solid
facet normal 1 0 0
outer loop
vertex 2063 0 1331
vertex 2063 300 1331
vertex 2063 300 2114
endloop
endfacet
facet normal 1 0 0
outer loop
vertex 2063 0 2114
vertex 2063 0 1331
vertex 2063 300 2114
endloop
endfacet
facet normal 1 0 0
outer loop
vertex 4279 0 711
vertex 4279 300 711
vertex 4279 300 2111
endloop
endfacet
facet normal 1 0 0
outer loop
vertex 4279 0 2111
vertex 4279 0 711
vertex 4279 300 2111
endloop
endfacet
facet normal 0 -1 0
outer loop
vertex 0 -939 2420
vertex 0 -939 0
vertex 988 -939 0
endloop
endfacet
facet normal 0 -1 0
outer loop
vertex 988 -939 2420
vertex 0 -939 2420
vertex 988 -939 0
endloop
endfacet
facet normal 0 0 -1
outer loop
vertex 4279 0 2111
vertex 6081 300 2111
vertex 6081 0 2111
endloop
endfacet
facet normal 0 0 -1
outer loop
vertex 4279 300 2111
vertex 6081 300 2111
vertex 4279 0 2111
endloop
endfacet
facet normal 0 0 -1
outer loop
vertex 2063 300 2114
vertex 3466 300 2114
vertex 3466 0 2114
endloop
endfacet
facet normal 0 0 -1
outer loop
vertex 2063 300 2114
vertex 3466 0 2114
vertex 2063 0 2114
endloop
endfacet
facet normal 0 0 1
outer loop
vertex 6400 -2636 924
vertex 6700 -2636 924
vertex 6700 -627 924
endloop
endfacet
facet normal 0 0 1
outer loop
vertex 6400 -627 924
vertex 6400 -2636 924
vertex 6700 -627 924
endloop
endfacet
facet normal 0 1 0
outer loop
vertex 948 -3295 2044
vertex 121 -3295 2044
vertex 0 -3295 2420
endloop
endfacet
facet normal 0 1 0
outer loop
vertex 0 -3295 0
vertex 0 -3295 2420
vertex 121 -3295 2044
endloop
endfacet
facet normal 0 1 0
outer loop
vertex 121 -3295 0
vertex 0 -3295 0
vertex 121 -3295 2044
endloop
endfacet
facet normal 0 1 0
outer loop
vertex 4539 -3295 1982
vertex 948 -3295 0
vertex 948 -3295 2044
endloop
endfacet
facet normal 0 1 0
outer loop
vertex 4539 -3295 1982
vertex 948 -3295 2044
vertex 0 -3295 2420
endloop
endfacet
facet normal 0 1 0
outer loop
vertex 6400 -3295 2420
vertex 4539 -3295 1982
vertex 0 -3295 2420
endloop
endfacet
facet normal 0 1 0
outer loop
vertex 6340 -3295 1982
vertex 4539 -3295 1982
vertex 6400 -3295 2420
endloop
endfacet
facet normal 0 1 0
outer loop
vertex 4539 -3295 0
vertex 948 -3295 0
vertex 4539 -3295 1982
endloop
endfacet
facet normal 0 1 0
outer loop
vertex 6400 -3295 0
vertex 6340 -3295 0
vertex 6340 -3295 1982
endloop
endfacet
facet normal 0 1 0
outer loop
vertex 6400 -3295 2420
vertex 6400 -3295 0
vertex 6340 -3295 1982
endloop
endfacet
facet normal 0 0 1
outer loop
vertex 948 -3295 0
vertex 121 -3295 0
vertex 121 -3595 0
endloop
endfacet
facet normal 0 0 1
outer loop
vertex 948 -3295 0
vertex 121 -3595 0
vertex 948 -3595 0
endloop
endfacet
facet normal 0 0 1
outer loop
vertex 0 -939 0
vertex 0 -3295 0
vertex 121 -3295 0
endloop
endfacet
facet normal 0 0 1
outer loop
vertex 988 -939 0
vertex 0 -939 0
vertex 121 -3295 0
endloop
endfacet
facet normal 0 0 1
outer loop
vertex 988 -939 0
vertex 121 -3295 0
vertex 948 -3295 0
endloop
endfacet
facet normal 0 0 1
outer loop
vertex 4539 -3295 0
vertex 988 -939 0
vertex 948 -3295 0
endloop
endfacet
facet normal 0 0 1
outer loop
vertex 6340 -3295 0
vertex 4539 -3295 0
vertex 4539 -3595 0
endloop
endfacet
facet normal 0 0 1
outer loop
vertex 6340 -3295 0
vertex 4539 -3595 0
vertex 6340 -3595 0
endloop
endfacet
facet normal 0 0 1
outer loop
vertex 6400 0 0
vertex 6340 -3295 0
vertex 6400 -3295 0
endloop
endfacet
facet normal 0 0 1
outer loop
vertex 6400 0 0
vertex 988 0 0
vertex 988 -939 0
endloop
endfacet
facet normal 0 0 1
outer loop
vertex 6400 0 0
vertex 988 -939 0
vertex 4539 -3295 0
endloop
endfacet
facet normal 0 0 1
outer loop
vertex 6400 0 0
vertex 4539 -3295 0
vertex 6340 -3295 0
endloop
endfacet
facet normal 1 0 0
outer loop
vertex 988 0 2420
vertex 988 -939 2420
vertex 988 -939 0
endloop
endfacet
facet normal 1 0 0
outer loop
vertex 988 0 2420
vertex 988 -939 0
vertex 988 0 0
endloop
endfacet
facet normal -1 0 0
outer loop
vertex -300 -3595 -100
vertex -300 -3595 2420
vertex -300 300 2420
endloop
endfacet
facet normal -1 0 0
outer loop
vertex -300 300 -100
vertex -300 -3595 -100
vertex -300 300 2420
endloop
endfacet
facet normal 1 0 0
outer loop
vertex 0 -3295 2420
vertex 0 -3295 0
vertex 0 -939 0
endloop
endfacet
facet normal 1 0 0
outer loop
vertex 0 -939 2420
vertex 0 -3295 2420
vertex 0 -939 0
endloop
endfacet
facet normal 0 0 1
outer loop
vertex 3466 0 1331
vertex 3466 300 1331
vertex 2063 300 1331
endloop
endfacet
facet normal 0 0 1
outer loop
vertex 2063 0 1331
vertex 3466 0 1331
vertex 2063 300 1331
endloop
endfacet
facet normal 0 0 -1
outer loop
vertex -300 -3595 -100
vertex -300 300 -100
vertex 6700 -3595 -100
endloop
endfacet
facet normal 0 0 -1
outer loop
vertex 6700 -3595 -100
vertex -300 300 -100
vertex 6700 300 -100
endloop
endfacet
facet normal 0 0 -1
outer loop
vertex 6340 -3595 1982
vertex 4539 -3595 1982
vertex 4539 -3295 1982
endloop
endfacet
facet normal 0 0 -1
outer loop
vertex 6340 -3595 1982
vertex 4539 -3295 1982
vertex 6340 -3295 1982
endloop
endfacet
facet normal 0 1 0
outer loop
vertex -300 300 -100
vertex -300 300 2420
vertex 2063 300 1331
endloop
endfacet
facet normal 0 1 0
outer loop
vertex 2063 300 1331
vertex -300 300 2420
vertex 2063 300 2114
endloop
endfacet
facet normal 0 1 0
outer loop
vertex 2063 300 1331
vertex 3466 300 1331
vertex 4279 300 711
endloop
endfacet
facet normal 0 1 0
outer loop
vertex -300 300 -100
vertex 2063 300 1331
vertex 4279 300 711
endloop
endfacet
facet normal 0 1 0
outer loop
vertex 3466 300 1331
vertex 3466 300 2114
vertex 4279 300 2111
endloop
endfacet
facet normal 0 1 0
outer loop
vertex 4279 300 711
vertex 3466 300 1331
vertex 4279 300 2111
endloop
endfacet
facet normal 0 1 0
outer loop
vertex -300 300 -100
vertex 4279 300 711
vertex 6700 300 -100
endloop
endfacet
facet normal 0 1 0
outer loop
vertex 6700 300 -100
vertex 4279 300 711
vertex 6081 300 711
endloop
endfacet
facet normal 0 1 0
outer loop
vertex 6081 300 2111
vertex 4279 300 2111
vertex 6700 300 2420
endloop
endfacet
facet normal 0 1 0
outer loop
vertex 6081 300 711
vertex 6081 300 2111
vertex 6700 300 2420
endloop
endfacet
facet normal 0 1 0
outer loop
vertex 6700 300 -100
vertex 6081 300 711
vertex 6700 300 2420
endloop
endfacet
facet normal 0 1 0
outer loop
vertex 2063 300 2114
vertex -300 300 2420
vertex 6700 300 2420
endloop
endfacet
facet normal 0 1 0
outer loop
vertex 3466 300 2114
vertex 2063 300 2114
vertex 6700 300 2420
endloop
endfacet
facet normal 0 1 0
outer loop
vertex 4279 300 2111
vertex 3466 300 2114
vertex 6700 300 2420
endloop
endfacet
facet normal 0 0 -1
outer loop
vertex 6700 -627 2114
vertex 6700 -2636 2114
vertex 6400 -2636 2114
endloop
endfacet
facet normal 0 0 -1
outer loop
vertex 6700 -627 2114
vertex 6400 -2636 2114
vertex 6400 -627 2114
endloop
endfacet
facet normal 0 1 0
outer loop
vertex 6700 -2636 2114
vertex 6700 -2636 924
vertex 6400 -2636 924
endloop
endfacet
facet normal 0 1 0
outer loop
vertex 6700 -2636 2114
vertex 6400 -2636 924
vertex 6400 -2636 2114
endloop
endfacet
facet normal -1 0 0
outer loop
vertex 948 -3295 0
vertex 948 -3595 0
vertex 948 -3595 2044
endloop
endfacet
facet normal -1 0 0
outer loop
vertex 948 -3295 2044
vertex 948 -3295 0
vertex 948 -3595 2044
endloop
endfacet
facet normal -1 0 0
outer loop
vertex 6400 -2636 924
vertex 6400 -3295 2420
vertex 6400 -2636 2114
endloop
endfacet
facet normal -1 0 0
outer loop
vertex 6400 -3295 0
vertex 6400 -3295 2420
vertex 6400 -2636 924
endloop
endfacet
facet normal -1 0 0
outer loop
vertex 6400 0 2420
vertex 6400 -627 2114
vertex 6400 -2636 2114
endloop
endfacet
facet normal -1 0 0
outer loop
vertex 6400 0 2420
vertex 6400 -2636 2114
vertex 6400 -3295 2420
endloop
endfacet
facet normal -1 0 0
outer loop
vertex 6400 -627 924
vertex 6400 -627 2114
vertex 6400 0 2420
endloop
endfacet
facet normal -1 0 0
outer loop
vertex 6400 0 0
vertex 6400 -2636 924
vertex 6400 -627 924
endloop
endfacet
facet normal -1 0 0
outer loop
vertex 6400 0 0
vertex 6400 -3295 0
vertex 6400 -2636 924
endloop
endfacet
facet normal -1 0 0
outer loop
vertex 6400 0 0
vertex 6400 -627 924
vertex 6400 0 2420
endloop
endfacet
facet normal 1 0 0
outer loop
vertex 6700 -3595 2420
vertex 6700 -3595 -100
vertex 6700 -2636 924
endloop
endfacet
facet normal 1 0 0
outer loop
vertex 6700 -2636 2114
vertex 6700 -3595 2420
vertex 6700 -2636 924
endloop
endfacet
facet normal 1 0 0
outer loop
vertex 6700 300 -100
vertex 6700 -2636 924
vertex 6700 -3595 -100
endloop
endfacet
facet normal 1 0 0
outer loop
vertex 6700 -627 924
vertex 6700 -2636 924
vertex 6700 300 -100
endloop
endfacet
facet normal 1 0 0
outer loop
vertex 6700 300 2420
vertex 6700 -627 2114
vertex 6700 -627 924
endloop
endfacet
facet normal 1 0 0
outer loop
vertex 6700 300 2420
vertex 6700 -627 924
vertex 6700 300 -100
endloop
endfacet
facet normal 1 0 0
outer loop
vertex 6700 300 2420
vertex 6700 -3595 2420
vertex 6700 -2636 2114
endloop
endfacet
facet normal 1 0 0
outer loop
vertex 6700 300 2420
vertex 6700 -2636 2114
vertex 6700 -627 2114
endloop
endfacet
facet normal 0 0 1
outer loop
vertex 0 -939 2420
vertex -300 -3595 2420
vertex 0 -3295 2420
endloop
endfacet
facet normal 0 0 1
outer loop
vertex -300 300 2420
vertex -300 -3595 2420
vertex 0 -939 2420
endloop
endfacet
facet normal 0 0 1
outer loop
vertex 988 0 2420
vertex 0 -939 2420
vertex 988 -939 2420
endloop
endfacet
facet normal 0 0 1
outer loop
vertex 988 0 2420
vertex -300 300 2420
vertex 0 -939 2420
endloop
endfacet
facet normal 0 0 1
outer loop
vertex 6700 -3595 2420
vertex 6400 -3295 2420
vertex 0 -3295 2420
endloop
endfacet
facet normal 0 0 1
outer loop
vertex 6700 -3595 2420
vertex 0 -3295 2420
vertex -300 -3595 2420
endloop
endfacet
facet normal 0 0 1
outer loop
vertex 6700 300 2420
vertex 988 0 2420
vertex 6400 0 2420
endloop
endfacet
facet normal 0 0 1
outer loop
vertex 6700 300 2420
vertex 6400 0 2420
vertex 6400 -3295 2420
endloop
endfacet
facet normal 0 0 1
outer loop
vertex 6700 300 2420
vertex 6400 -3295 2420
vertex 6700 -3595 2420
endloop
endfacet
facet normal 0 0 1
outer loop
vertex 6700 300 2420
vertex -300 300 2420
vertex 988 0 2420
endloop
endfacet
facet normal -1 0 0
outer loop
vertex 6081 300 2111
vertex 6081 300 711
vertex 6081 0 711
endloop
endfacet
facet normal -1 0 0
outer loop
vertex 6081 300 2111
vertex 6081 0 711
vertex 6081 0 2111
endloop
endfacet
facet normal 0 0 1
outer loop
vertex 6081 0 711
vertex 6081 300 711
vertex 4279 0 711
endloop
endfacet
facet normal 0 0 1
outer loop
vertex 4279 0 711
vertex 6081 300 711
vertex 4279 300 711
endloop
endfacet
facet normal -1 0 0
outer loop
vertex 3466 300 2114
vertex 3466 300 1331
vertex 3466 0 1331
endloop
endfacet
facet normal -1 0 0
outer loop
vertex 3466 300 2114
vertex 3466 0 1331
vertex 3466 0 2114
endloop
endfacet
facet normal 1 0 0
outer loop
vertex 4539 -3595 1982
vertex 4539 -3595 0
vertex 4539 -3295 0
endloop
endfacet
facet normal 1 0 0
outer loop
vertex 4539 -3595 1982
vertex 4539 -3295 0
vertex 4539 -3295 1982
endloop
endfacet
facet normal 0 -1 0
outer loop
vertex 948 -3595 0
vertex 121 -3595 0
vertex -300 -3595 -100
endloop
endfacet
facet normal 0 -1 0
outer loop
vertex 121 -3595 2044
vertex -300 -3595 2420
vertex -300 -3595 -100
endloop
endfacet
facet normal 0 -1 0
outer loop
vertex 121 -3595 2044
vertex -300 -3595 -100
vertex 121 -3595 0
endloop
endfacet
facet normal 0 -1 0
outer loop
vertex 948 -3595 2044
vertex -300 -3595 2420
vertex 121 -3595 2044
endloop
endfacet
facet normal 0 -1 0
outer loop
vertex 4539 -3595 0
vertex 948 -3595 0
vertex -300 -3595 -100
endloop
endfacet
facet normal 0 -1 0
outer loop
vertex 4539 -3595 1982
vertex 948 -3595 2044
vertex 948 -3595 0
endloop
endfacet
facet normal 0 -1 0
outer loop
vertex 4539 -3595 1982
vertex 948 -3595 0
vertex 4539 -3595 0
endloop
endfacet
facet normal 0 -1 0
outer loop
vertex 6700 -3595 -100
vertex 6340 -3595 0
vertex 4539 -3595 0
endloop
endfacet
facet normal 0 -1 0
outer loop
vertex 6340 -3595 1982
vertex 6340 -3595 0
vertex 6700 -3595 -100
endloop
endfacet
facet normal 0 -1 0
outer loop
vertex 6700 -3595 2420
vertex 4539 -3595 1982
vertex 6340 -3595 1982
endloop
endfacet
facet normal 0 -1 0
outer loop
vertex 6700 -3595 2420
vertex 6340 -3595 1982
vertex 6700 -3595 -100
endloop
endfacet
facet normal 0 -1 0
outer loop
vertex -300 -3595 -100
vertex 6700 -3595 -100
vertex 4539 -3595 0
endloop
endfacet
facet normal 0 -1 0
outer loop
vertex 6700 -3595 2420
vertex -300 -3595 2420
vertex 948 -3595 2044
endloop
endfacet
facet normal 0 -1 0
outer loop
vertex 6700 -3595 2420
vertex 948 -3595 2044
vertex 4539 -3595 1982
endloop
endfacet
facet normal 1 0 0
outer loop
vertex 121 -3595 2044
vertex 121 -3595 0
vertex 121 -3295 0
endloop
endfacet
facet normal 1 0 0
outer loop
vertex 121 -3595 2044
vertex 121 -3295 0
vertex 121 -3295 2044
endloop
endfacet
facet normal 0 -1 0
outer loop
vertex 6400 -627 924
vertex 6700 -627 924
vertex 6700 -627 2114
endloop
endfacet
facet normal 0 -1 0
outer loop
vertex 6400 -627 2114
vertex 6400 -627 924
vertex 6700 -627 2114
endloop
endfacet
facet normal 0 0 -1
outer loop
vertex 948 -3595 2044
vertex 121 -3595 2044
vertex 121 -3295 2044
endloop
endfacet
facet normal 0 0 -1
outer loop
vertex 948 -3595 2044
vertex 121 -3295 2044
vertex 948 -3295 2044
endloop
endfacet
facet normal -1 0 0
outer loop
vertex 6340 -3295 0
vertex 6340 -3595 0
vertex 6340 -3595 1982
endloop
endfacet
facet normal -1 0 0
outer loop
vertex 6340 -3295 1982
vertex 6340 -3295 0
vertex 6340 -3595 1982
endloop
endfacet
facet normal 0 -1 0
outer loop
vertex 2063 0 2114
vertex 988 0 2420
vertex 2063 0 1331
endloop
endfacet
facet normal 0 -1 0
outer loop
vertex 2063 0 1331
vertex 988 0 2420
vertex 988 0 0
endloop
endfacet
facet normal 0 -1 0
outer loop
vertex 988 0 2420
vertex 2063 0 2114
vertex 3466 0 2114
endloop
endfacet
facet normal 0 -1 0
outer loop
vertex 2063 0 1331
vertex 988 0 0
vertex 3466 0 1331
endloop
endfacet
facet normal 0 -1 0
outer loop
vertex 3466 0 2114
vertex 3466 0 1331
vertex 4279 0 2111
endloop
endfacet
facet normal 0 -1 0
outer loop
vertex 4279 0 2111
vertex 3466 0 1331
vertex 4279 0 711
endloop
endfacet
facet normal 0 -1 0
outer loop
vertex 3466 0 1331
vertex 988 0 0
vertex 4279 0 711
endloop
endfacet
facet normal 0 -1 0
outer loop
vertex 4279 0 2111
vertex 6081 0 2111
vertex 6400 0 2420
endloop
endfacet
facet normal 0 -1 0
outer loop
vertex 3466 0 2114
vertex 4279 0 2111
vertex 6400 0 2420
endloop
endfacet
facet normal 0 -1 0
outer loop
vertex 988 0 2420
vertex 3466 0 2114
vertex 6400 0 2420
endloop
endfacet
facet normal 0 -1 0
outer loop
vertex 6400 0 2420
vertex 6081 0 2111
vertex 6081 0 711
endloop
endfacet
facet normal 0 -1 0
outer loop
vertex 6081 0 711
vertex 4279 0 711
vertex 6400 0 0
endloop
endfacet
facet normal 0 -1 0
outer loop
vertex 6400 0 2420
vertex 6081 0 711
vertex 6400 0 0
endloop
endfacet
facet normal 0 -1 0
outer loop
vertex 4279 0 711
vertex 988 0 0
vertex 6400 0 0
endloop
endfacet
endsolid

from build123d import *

# Parameters (mm, degrees)
F0_W      = 7000
F0_H      = 3895
F0_W_2    = 6400
F0_H_2    = 3295
F1_DEPTH  = 2420
F2_W      = 1801
F2_H      = 1982
F3_DEPTH  = 300
F4_W      = 827
F4_H      = 2044
F5_DEPTH  = 300
F6_W      = 2009
F6_H      = 1190
F7_DEPTH  = 300
F8_W      = 1802
F8_H      = 1400
F9_DEPTH  = 300
F10_W     = 988
F10_H     = 939
F11_DEPTH = 2420
F12_W     = 1403
F12_H     = 783
F13_DEPTH = 300
F14_W     = 7000
F14_H     = 3895
F15_DEPTH = 100


with BuildPart() as f1:
    # F0 (on Top) → F1 (new body)
    with BuildSketch(Plane.XY):
        with Locations((3200, -1647.5)):
            Rectangle(F0_W, F0_H)
        with Locations((3200, -1647.5)):
            Rectangle(F0_W_2, F0_H_2, mode=Mode.SUBTRACT)
    extrude(amount=F1_DEPTH)

    # F2 (on face) → F3 (cut)
    with BuildSketch(Plane.XZ.offset(3595)):
        with Locations((5439.5, 991)):
            Rectangle(F2_W, F2_H)
    extrude(amount=-F3_DEPTH, mode=Mode.SUBTRACT)

    # F4 (on face) → F5 (cut)
    with BuildSketch(Plane.XZ.offset(3595)):
        with Locations((534.5, 1022)):
            Rectangle(F4_W, F4_H)
    extrude(amount=-F5_DEPTH, mode=Mode.SUBTRACT)

    # F6 (on face) → F7 (cut)
    with BuildSketch(Plane.YZ.offset(6700)):
        with Locations((-1631.5, 1519)):
            Rectangle(F6_W, F6_H)
    extrude(amount=-F7_DEPTH, mode=Mode.SUBTRACT)

    # F8 (on face) → F9 (cut)
    with BuildSketch(Plane(origin=(0, 300, 0), x_dir=(-1, 0, 0), z_dir=(0, 1, 0))):
        with Locations((-5180, 1411)):
            Rectangle(F8_W, F8_H)
    extrude(amount=-F9_DEPTH, mode=Mode.SUBTRACT)

    # F10 (on Top) → F11 (join)
    with BuildSketch(Plane.XY):
        with Locations((494, -469.5)):
            Rectangle(F10_W, F10_H)
    extrude(amount=F11_DEPTH)

    # F12 (on face) → F13 (cut)
    with BuildSketch(Plane(origin=(0, 300, 0), x_dir=(-1, 0, 0), z_dir=(0, 1, 0))):
        with Locations((-2764.5, 1722.5)):
            Rectangle(F12_W, F12_H)
    extrude(amount=-F13_DEPTH, mode=Mode.SUBTRACT)

    # F14 (on Top) → F15 (join)
    with BuildSketch(Plane.XY):
        with Locations((3200, -1647.5)):
            Rectangle(F14_W, F14_H)
    extrude(amount=-F15_DEPTH)


solid = f1.part
